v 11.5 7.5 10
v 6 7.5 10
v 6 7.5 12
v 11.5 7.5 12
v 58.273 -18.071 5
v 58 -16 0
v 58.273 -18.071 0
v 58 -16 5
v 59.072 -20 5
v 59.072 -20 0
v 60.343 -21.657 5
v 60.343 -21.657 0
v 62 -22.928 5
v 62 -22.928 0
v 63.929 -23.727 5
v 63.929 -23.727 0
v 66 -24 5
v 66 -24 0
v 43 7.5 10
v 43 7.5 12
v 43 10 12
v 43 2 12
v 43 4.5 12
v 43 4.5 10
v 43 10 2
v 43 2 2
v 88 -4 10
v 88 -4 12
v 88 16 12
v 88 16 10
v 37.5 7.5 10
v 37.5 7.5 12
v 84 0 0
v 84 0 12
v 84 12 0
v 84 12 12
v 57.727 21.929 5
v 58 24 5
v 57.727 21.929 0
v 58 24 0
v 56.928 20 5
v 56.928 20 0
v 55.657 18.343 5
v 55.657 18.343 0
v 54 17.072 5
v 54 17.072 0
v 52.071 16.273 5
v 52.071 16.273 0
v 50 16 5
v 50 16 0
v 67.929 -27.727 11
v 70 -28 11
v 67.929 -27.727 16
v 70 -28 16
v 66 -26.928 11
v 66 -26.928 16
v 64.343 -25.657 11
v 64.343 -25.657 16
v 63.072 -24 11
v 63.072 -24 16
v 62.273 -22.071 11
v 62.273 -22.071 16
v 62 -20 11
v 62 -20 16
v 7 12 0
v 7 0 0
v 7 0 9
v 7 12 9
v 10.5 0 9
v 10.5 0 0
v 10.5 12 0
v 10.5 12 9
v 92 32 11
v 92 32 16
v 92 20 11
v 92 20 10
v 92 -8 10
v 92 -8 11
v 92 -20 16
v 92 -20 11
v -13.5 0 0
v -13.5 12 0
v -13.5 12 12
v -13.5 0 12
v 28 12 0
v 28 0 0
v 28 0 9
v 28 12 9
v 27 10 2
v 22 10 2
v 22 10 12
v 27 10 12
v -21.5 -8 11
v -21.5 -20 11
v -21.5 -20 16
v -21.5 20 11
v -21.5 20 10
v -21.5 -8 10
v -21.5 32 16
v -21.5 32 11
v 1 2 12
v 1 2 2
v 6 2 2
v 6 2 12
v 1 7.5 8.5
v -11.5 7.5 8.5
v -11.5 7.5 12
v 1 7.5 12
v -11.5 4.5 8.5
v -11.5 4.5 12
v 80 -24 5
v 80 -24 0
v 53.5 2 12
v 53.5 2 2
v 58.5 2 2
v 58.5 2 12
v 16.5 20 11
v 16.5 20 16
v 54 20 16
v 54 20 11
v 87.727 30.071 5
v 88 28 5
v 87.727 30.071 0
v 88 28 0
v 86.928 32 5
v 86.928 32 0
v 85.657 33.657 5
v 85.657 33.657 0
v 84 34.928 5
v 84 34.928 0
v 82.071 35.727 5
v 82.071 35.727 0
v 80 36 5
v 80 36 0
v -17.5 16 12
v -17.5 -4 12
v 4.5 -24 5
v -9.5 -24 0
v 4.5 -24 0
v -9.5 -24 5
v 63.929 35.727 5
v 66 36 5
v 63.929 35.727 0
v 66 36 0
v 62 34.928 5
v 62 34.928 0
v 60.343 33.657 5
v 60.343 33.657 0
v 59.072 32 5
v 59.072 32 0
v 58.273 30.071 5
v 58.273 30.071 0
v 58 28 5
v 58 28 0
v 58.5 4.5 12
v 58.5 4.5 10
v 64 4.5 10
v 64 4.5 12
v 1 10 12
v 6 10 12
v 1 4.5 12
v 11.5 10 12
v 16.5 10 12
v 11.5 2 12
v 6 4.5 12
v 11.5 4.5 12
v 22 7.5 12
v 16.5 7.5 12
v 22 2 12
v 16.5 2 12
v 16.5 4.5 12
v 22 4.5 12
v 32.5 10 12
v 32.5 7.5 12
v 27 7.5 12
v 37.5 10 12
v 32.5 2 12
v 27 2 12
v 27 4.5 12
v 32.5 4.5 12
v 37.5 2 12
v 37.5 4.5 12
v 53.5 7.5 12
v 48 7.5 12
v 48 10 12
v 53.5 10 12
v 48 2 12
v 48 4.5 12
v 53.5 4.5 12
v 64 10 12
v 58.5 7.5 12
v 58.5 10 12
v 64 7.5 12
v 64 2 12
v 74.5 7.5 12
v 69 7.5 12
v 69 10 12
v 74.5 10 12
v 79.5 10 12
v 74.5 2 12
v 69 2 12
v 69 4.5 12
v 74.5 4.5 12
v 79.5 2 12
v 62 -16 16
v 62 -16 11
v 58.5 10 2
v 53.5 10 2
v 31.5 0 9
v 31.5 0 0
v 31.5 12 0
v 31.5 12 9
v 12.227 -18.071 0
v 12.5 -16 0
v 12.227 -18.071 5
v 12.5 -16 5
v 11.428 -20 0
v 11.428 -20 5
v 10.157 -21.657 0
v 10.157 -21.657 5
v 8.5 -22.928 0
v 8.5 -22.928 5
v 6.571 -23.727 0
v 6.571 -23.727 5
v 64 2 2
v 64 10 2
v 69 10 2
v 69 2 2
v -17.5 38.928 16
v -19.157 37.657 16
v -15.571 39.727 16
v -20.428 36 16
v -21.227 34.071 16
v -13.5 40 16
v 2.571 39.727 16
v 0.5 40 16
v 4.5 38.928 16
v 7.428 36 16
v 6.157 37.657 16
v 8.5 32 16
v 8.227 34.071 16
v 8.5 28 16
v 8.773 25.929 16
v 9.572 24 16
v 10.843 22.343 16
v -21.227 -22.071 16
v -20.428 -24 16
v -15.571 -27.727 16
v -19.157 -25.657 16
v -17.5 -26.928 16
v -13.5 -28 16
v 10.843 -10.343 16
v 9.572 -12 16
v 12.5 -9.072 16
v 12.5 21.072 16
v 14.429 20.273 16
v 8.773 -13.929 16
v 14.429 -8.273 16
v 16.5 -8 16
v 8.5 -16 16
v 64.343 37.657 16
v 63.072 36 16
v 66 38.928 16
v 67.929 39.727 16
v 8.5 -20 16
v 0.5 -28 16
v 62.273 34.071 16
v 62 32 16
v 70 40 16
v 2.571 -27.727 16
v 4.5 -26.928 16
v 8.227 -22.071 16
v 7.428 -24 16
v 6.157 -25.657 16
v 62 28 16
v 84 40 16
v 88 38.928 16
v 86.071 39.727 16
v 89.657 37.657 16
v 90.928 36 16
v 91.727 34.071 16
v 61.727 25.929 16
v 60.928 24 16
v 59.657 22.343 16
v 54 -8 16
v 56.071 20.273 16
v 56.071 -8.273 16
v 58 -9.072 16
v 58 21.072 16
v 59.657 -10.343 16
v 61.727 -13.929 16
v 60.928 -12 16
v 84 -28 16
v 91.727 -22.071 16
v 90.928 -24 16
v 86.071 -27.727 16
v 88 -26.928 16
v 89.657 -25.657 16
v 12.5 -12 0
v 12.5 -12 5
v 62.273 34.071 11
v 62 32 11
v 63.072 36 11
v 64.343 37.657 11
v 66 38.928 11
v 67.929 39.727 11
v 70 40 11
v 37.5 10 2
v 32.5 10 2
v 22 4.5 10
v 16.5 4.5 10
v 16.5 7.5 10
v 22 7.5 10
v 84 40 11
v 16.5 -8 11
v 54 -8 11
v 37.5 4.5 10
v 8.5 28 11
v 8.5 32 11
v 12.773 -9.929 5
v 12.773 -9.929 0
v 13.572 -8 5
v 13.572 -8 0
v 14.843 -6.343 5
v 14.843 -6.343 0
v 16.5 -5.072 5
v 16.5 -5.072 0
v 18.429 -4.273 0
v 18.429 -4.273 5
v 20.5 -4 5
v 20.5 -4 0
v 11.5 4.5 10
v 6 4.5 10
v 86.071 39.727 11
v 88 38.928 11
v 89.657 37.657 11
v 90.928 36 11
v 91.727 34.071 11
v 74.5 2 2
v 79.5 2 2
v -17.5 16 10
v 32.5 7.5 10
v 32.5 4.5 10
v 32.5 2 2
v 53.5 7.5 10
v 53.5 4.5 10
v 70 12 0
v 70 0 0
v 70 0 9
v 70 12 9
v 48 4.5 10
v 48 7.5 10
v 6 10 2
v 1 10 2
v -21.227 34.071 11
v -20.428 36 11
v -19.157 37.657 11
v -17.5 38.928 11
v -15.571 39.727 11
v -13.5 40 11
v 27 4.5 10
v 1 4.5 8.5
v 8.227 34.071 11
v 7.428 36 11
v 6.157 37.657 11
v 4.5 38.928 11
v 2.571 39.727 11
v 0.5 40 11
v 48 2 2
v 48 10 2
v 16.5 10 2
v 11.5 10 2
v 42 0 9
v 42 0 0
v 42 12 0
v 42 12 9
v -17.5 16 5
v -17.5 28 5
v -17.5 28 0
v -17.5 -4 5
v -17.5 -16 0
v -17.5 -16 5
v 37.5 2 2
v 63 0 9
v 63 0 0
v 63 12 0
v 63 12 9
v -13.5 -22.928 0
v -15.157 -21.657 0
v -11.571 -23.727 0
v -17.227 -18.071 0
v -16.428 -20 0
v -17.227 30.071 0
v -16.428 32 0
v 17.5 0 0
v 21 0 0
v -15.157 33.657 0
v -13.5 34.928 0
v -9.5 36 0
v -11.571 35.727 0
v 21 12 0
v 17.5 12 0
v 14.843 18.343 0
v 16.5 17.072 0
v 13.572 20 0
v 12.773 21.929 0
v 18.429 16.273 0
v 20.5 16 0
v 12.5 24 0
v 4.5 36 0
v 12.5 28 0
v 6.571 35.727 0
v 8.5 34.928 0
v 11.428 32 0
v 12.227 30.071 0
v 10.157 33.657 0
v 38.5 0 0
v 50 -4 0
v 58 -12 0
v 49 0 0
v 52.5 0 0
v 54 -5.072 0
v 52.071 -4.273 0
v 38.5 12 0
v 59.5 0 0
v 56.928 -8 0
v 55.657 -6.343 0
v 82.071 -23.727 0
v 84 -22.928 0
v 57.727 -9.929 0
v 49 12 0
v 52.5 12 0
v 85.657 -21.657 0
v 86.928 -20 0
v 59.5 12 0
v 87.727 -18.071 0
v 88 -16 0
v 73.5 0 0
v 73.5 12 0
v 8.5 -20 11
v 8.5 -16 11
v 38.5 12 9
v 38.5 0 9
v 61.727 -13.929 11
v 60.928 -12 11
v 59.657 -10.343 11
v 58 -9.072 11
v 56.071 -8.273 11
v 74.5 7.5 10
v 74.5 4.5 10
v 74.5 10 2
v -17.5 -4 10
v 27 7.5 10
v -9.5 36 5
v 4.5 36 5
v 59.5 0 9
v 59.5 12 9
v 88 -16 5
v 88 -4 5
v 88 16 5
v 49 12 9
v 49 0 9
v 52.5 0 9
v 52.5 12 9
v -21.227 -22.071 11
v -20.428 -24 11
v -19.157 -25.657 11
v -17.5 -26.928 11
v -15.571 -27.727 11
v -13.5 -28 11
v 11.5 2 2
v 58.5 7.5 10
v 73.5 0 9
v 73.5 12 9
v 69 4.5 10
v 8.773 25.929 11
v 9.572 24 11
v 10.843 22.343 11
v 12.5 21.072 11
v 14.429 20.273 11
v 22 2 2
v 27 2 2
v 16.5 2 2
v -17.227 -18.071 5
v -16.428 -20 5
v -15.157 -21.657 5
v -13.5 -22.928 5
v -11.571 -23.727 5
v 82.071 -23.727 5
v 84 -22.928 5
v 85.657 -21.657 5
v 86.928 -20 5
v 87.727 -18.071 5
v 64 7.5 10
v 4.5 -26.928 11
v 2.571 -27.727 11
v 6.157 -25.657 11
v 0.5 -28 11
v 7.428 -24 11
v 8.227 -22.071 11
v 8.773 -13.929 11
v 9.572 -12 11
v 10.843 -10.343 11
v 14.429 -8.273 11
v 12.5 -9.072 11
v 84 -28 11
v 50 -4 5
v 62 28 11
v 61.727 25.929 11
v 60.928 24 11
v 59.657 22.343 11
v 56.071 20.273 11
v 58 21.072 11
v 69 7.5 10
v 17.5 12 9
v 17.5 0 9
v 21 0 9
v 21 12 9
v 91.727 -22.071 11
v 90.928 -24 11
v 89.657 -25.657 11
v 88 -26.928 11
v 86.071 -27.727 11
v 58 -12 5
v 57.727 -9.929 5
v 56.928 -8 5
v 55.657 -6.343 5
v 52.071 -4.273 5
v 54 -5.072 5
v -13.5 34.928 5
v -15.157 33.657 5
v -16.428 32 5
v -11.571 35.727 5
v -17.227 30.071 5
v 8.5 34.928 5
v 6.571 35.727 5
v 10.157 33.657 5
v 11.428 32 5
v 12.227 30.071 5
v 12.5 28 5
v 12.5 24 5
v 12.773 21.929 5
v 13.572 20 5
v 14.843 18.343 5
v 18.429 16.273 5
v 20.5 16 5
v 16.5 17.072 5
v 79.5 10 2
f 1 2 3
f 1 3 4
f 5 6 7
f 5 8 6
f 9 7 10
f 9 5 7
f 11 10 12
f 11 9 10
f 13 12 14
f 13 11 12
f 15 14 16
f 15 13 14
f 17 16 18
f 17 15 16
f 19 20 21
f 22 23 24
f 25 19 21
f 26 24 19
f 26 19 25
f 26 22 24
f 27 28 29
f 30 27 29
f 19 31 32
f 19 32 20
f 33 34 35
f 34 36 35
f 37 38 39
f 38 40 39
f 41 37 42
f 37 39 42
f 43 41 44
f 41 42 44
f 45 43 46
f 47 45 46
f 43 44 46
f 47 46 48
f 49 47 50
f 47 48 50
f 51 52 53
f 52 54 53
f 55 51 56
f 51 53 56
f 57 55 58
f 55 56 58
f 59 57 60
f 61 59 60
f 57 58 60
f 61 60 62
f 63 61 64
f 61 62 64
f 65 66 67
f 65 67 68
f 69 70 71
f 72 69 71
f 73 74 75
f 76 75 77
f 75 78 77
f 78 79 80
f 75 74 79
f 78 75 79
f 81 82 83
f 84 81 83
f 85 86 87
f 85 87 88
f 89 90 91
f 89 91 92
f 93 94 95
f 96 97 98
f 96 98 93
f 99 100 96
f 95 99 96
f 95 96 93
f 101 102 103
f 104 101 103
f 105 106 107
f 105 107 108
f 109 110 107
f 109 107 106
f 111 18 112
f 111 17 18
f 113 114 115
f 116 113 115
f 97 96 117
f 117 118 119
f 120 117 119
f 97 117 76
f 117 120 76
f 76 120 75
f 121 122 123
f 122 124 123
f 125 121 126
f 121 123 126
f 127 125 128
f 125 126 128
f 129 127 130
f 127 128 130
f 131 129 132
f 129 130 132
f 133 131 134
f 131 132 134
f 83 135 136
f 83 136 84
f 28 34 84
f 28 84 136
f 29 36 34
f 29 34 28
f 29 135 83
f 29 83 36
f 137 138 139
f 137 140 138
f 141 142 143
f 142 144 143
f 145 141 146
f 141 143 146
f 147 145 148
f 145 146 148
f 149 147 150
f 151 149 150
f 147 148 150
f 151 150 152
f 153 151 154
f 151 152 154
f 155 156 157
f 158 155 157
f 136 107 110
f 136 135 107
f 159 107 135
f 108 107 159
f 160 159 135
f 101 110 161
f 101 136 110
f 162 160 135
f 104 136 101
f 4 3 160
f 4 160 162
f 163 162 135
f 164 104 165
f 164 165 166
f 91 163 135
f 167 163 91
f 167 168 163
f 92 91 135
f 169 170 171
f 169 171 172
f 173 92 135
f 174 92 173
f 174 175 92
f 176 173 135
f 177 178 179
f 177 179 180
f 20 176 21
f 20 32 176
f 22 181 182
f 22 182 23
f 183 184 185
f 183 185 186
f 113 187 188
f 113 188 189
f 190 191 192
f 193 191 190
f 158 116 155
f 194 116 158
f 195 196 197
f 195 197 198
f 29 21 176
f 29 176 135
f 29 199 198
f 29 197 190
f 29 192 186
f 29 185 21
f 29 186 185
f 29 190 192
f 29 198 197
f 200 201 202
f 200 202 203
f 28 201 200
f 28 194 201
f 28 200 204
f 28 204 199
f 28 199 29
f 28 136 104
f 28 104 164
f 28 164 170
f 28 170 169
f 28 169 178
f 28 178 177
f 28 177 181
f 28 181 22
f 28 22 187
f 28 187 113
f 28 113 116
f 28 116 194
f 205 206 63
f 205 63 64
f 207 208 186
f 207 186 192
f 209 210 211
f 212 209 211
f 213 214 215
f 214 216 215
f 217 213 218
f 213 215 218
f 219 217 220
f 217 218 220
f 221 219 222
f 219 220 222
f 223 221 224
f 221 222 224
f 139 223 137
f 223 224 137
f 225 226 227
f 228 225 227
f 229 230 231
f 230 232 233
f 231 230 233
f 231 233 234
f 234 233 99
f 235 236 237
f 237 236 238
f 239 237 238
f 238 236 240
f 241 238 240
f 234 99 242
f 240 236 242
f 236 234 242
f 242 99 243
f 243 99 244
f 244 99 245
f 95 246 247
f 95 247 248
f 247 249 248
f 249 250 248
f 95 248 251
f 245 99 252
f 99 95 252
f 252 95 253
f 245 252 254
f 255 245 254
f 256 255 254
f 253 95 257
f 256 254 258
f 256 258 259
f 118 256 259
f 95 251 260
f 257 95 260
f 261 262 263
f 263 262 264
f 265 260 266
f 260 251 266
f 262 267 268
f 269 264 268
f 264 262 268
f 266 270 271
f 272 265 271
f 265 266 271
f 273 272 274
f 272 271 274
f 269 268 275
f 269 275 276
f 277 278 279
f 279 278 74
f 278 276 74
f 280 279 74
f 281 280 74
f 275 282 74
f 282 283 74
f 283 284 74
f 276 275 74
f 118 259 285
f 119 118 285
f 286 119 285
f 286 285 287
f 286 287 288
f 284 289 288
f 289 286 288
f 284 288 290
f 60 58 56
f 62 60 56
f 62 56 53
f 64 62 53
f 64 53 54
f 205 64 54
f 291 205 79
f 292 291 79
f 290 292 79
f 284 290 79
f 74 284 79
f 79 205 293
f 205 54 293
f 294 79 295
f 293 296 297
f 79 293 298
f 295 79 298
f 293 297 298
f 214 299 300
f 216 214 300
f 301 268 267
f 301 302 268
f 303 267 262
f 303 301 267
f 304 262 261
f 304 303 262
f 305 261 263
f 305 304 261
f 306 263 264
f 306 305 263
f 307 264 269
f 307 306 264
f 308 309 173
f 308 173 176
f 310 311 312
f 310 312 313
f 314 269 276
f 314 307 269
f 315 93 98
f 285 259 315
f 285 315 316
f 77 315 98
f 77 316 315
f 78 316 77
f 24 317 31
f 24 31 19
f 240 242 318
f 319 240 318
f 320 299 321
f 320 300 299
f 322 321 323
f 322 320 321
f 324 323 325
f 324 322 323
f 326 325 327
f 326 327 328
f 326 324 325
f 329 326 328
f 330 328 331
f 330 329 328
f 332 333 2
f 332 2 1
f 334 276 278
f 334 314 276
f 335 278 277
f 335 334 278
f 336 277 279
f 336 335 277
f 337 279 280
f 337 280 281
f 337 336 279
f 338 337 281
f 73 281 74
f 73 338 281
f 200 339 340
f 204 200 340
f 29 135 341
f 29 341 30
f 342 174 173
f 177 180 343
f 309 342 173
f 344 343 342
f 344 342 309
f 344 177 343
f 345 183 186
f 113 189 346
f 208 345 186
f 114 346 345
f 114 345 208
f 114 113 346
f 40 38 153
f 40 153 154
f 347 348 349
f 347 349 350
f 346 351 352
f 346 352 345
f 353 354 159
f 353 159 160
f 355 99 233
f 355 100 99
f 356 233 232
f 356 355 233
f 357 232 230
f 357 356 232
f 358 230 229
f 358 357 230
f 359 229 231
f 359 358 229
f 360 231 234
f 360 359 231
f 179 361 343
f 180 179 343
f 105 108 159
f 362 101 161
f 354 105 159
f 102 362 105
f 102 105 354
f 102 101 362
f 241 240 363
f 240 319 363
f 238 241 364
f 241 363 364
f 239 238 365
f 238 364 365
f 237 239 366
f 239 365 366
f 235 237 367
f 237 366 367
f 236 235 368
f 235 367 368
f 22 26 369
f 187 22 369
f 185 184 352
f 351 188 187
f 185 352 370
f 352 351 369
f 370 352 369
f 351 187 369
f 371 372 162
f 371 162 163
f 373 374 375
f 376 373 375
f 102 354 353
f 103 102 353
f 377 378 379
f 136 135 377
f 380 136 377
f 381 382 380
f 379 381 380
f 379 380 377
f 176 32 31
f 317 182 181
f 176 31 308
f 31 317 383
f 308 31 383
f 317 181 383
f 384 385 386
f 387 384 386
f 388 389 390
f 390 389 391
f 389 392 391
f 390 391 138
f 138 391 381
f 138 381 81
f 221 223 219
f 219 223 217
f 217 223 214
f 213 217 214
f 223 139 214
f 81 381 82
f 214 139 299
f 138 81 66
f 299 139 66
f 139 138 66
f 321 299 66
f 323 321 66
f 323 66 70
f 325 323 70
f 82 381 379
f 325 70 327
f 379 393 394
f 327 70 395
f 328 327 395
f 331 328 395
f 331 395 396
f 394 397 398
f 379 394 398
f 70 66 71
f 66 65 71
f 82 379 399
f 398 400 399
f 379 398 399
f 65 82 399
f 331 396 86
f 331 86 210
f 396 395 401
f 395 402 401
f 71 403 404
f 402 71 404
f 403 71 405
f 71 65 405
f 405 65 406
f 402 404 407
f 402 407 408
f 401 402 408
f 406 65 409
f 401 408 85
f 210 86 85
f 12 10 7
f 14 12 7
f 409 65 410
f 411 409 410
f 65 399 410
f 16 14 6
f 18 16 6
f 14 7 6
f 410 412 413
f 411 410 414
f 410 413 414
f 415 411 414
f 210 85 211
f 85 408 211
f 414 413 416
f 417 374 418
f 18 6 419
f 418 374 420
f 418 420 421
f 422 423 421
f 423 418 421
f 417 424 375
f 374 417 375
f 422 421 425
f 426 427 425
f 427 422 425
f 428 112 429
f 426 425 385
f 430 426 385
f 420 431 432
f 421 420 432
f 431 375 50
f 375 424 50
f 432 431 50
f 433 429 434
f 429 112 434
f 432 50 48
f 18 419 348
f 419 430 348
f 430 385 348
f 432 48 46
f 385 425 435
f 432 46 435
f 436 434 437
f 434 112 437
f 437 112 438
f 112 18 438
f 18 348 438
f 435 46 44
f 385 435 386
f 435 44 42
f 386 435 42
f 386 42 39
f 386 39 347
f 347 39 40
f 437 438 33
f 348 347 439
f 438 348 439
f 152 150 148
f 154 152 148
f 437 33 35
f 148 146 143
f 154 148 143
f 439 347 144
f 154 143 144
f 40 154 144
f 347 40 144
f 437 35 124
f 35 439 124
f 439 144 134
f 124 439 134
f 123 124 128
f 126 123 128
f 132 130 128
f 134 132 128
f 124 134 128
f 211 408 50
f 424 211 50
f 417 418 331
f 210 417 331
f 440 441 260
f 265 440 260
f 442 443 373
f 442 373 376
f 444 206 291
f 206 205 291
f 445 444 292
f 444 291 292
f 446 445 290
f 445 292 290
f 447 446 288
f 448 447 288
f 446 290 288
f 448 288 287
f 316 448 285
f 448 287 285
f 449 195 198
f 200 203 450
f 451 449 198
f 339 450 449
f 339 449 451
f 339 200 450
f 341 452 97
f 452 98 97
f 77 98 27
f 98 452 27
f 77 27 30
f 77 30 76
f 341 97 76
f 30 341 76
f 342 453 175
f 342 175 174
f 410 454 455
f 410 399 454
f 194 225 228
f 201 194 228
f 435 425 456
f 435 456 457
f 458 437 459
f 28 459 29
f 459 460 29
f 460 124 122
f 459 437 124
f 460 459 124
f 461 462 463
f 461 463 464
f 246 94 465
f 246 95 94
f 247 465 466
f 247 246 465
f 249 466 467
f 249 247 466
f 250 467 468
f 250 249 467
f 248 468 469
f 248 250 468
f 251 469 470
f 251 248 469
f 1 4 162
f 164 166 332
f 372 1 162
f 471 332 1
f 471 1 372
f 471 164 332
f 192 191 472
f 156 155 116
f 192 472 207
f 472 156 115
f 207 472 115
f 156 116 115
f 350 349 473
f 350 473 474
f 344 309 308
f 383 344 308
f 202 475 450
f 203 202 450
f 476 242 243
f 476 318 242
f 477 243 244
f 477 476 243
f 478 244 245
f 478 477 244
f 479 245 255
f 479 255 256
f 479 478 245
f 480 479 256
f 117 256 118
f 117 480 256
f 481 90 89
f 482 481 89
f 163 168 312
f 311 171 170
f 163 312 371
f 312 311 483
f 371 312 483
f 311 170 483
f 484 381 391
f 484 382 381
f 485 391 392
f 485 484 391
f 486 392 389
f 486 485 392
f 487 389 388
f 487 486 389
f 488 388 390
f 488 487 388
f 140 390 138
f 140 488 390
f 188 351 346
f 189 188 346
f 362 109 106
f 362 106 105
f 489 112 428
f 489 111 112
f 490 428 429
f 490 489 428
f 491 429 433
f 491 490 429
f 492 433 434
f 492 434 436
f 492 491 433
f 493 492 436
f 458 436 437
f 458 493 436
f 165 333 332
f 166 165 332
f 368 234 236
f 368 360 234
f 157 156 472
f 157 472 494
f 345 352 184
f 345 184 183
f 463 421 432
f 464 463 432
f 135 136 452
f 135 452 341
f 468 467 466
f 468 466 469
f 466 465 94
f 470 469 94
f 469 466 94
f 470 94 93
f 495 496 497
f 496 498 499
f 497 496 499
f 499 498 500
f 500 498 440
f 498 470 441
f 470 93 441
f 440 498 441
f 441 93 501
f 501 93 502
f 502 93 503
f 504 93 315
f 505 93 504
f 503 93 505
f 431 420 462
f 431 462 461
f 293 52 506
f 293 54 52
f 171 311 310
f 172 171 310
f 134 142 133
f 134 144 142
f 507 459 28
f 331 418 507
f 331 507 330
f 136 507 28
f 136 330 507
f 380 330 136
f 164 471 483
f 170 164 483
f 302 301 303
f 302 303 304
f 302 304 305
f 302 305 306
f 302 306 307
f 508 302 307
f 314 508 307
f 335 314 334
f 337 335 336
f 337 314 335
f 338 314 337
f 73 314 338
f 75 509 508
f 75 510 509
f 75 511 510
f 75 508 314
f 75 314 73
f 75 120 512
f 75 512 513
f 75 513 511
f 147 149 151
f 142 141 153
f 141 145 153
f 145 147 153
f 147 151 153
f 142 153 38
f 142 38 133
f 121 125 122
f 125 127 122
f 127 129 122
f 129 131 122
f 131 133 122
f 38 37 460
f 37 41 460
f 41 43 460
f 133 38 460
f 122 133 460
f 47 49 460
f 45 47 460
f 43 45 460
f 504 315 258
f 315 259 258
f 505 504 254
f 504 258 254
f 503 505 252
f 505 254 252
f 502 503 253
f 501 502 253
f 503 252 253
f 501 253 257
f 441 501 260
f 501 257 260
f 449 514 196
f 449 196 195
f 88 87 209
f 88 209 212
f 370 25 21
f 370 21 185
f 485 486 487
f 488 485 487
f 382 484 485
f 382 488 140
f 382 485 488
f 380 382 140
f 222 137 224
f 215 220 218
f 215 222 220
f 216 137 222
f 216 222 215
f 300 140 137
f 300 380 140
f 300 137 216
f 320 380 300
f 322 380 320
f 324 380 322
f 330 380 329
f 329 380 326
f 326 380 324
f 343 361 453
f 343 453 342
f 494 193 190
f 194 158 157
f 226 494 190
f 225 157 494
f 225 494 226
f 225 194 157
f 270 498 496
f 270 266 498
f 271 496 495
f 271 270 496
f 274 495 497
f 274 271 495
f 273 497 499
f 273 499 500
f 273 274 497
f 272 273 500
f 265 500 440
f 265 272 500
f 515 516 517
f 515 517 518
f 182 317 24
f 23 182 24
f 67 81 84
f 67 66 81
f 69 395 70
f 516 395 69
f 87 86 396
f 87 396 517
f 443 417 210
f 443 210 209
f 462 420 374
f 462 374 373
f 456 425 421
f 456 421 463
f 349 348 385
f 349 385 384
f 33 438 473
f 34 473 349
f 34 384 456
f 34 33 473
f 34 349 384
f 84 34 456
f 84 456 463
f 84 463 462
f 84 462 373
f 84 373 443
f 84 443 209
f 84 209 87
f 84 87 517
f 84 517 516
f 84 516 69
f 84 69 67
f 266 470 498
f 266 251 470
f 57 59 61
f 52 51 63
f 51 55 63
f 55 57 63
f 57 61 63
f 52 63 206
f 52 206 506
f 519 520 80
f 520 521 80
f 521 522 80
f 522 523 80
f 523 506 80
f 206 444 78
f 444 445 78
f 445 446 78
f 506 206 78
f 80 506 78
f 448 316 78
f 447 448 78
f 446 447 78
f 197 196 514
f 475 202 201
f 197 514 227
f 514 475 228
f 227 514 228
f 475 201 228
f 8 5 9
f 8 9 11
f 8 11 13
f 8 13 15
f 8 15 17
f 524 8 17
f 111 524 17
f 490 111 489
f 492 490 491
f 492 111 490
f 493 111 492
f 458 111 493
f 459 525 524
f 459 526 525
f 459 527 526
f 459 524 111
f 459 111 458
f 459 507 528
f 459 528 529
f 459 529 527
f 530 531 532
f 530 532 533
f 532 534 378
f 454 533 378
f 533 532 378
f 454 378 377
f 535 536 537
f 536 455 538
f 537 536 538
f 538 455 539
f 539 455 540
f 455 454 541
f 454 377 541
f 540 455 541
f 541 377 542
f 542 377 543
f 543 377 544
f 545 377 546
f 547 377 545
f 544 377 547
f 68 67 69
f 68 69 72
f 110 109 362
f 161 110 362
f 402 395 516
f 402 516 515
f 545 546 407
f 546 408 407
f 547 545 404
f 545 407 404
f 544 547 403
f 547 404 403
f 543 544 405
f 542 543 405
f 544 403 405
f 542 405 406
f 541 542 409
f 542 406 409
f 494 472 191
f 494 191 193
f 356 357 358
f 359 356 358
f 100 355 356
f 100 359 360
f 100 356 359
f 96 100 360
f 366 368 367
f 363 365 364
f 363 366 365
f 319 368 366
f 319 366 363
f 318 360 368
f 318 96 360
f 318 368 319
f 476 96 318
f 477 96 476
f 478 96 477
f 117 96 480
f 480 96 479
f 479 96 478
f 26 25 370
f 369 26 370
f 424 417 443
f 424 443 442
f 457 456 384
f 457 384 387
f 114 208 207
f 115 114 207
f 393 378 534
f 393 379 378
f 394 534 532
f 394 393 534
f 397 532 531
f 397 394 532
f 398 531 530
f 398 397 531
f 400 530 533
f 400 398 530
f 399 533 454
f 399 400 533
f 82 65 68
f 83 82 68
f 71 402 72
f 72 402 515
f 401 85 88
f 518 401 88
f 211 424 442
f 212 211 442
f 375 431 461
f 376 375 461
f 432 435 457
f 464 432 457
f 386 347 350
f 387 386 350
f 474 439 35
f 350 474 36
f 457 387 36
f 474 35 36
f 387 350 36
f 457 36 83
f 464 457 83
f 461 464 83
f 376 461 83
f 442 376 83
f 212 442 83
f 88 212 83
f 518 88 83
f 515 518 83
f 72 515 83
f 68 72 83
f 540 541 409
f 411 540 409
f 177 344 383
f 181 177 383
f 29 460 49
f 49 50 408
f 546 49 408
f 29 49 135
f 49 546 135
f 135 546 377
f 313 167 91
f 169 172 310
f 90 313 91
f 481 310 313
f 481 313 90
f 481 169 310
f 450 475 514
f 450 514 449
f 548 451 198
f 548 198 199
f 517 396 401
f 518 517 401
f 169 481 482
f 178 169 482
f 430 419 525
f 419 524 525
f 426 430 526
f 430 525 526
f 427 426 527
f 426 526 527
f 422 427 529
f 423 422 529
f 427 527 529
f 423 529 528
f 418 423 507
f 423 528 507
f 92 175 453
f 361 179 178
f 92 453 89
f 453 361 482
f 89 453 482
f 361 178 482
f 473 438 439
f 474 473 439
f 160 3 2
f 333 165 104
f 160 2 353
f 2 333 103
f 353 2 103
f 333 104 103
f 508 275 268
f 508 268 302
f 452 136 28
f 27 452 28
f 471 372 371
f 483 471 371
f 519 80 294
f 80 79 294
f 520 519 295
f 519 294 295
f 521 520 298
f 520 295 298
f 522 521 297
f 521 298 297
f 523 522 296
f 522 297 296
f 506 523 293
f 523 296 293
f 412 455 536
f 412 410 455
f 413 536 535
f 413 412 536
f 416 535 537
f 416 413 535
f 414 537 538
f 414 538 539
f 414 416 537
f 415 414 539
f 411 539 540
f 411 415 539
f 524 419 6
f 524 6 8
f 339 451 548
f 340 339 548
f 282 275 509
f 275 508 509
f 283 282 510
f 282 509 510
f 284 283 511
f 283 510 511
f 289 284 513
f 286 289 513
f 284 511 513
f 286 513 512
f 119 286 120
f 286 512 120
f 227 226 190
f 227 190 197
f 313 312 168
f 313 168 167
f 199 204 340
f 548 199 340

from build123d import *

# Parameters (mm, degrees)
SKETCH2_W            = 7
SKETCH2_H            = 12
BOSS_EXTRUDE1_DEPTH  = 12
SKETCH3_W            = 5
SKETCH3_H            = 8
CUT_EXTRUDE1_DEPTH   = 10
SKETCH4_W            = 3
SKETCH4_H            = 12
BOSS_EXTRUDE2_DEPTH  = 3.5
LPATTERN1_COUNT      = 8
LPATTERN1_PITCH      = 10.5
SKETCH5_W            = 9
SKETCH5_H            = 12
BOSS_EXTRUDE3_DEPTH  = 3.5
SKETCH6_W            = 12
SKETCH6_H            = 12
BOSS_EXTRUDE4_DEPTH  = 13.5
SKETCH7_W            = 12.5
SKETCH7_H            = 3
CUT_EXTRUDE2_DEPTH   = 3.5
SKETCH8_W            = 68.5
SKETCH8_H            = 3
CUT_EXTRUDE3_DEPTH   = 2
SKETCH11_W           = 105.5
SKETCH11_H           = 20
BOSS_EXTRUDE6_DEPTH  = 16
SPLIT1_START         = -4
SPLIT1_OUTLINE_W     = 105.5
SPLIT1_OUTLINE_H     = 4
SPLIT1_DEPTH         = 20
SPLIT1_START_2       = 2
SPLIT1_2_OUTLINE_W   = 5
SPLIT1_2_OUTLINE_H   = 10
SPLIT1_2_DEPTH       = 8
SPLIT1_START_3       = 4.5
SPLIT1_3_OUTLINE_W   = 5.5
SPLIT1_3_OUTLINE_H   = 2
SPLIT1_3_OUTLINE_W_2 = 12.5
SPLIT1_3_OUTLINE_H_2 = 3.5
SPLIT1_3_DEPTH       = 3
SPLIT1_START_4       = 12
SPLIT1_4_OUTLINE_W   = 105.5
SPLIT1_4_OUTLINE_H   = 20
SPLIT1_4_DEPTH       = 4
SPLIT1_5_OUTLINE_W   = 5
SPLIT1_5_OUTLINE_H   = 8
SPLIT1_5_DEPTH       = 10
SPLIT1_START_5       = 10
SPLIT1_6_OUTLINE_W   = 5.5
SPLIT1_6_OUTLINE_H   = 3
SPLIT1_6_DEPTH       = 2
SKETCH12_W           = 30
SKETCH12_H           = 5
BOSS_EXTRUDE7_DEPTH  = 20
SKETCH13_W           = 30
SKETCH13_H           = 5
BOSS_EXTRUDE8_DEPTH  = 20
FILLET1_R            = 8
SKETCH14_W           = 113.5
SKETCH14_H           = 28
SKETCH14_W_2         = 105.5
SKETCH14_H_2         = 20
BOSS_EXTRUDE9_DEPTH  = 6
SKETCH16_W           = 30
SKETCH16_H           = 5
BOSS_EXTRUDE10_DEPTH = 20
SKETCH17_W           = 30
SKETCH17_H           = 5
BOSS_EXTRUDE11_DEPTH = 20
FILLET2_R            = 8


# Read off the part's stored shape, not the designer's step: Split1
with BuildPart() as part:
    # Sketch2 → Boss-Extrude1 (new body)
    with BuildSketch(Plane.XY):
        with Locations((3.5, 6)):
            Rectangle(SKETCH2_W, SKETCH2_H)
    extrude(amount=BOSS_EXTRUDE1_DEPTH)

    # Sketch3 → Cut-Extrude1 (cut)
    with BuildSketch(Plane.XY.offset(12)):
        with Locations((3.5, 6)):
            Rectangle(SKETCH3_W, SKETCH3_H)
    extrude(amount=-CUT_EXTRUDE1_DEPTH, mode=Mode.SUBTRACT)

    # Sketch4 → Boss-Extrude2 (add)
    with BuildSketch(Plane(origin=(7, 0, 0), x_dir=(0, 0, -1), z_dir=(1, 0, 0))):
        with Locations((-10.5, 6)):
            Rectangle(SKETCH4_W, SKETCH4_H)
    extrude(amount=BOSS_EXTRUDE2_DEPTH)


with BuildPart() as lpattern1_1:
    # LPattern1: pattern copy
    add(part.part.moved(Location(Vector(1, 0, 0) * (1 * LPATTERN1_PITCH))))


with BuildPart() as lpattern1_2:
    # LPattern1: pattern copy
    add(part.part.moved(Location(Vector(1, 0, 0) * (2 * LPATTERN1_PITCH))))


with BuildPart() as lpattern1_3:
    # LPattern1: pattern copy
    add(part.part.moved(Location(Vector(1, 0, 0) * (3 * LPATTERN1_PITCH))))


with BuildPart() as lpattern1_4:
    # LPattern1: pattern copy
    add(part.part.moved(Location(Vector(1, 0, 0) * (4 * LPATTERN1_PITCH))))


with BuildPart() as lpattern1_5:
    # LPattern1: pattern copy
    add(part.part.moved(Location(Vector(1, 0, 0) * (5 * LPATTERN1_PITCH))))


with BuildPart() as lpattern1_6:
    # LPattern1: pattern copy
    add(part.part.moved(Location(Vector(1, 0, 0) * (6 * LPATTERN1_PITCH))))


with BuildPart() as lpattern1_7:
    # LPattern1: pattern copy
    add(part.part.moved(Location(Vector(1, 0, 0) * (7 * LPATTERN1_PITCH))))

    # Combine2: union LPattern1_4, LPattern1_1, part, LPattern1_6, LPattern1_3, LPattern1_5, LPattern1_2
    add(lpattern1_4.part)
    add(lpattern1_1.part)
    add(part.part)
    add(lpattern1_6.part)
    add(lpattern1_3.part)
    add(lpattern1_5.part)
    add(lpattern1_2.part)

    # Sketch5 → Boss-Extrude3 (add)
    with BuildSketch(Plane(origin=(80.5, 0, 0), x_dir=(0, 0, -1), z_dir=(1, 0, 0))):
        with Locations((-4.5, 6)):
            Rectangle(SKETCH5_W, SKETCH5_H)
    extrude(amount=BOSS_EXTRUDE3_DEPTH)

    # Sketch6 → Boss-Extrude4 (add)
    with BuildSketch(Plane.ZY):
        with Locations((6, 6)):
            Rectangle(SKETCH6_W, SKETCH6_H)
    extrude(amount=BOSS_EXTRUDE4_DEPTH)

    # Sketch7 → Cut-Extrude2 (cut)
    with BuildSketch(Plane.XY.offset(12)):
        with Locations((-5.25, 6)):
            Rectangle(SKETCH7_W, SKETCH7_H)
    extrude(amount=-CUT_EXTRUDE2_DEPTH, mode=Mode.SUBTRACT)

    # Sketch8 → Cut-Extrude3 (cut)
    with BuildSketch(Plane.XY.offset(12)):
        with Locations((40.25, 6)):
            Rectangle(SKETCH8_W, SKETCH8_H)
    extrude(amount=-CUT_EXTRUDE3_DEPTH, mode=Mode.SUBTRACT)


with BuildPart() as body_2:
    # Sketch11 → Boss-Extrude6 (new body)
    with BuildSketch(Plane(origin=(0, 0, 0), x_dir=(-1, 0, 0), z_dir=(0, 0, -1))):
        with Locations((-35.25, 6)):
            Rectangle(SKETCH11_W, SKETCH11_H)
    extrude(amount=-BOSS_EXTRUDE6_DEPTH)

    # Combine3: cut LPattern1_7
    add(lpattern1_7.part, mode=Mode.SUBTRACT)

    # Split1 4 outline → Split1 4 (cut)
    with BuildSketch(Plane.XY.offset(SPLIT1_START_4)):
        with Locations((35.25, 6)):
            Rectangle(SPLIT1_4_OUTLINE_W, SPLIT1_4_OUTLINE_H)
    extrude(amount=SPLIT1_4_DEPTH, mode=Mode.SUBTRACT)

    # Split1 5 outline → Split1 5 (cut)
    with BuildSketch(Plane.XY.offset(SPLIT1_START_2)):
        with Locations((77, 6)):
            Rectangle(SPLIT1_5_OUTLINE_W, SPLIT1_5_OUTLINE_H)
        with Locations((66.5, 6)):
            Rectangle(SPLIT1_5_OUTLINE_W, SPLIT1_5_OUTLINE_H)
        with Locations((56, 6)):
            Rectangle(SPLIT1_5_OUTLINE_W, SPLIT1_5_OUTLINE_H)
        with Locations((45.5, 6)):
            Rectangle(SPLIT1_5_OUTLINE_W, SPLIT1_5_OUTLINE_H)
        with Locations((35, 6)):
            Rectangle(SPLIT1_5_OUTLINE_W, SPLIT1_5_OUTLINE_H)
        with Locations((24.5, 6)):
            Rectangle(SPLIT1_5_OUTLINE_W, SPLIT1_5_OUTLINE_H)
        with Locations((14, 6)):
            Rectangle(SPLIT1_5_OUTLINE_W, SPLIT1_5_OUTLINE_H)
        Polygon((6, 10), (1, 10), (1, 7.5), (-11.5, 7.5), (-11.5, 4.5), (1, 4.5), (1, 2), (6, 2), align=None)
    extrude(amount=SPLIT1_5_DEPTH, mode=Mode.SUBTRACT)

    # Split1 6 outline → Split1 6 (cut)
    with BuildSketch(Plane.XY.offset(SPLIT1_START_5)):
        with Locations((71.75, 6)):
            Rectangle(SPLIT1_6_OUTLINE_W, SPLIT1_6_OUTLINE_H)
        with Locations((61.25, 6)):
            Rectangle(SPLIT1_6_OUTLINE_W, SPLIT1_6_OUTLINE_H)
        with Locations((50.75, 6)):
            Rectangle(SPLIT1_6_OUTLINE_W, SPLIT1_6_OUTLINE_H)
        with Locations((40.25, 6)):
            Rectangle(SPLIT1_6_OUTLINE_W, SPLIT1_6_OUTLINE_H)
        with Locations((29.75, 6)):
            Rectangle(SPLIT1_6_OUTLINE_W, SPLIT1_6_OUTLINE_H)
        with Locations((19.25, 6)):
            Rectangle(SPLIT1_6_OUTLINE_W, SPLIT1_6_OUTLINE_H)
        with Locations((8.75, 6)):
            Rectangle(SPLIT1_6_OUTLINE_W, SPLIT1_6_OUTLINE_H)
    extrude(amount=SPLIT1_6_DEPTH, mode=Mode.SUBTRACT)

    # Sketch12 → Boss-Extrude7 (add)
    with BuildSketch(Plane(origin=(0, 16, 0), x_dir=(1, 0, 0), z_dir=(0, 1, 0))):
        with Locations((-2.5, -2.5)):
            Rectangle(SKETCH12_W, SKETCH12_H)
        with Locations((73, -2.5)):
            Rectangle(SKETCH12_W, SKETCH12_H)
    extrude(amount=BOSS_EXTRUDE7_DEPTH)

    # Sketch13 → Boss-Extrude8 (add)
    with BuildSketch(Plane.XZ.offset(4)):
        with Locations((73, 2.5)):
            Rectangle(SKETCH13_W, SKETCH13_H)
        with Locations((-2.5, 2.5)):
            Rectangle(SKETCH13_W, SKETCH13_H)
    extrude(amount=BOSS_EXTRUDE8_DEPTH)

    # Fillet1
    fillet1_edges = [body_2.edges().sort_by_distance(p)[0] for p in [
        (58, 16, 2.5),
        (58, 36, 2.5),
        (88, 36, 2.5),
        (58, -4, 2.5),
        (88, -24, 2.5),
        (58, -24, 2.5),
        (12.5, -4, 2.5),
        (12.5, -24, 2.5),
        (-17.5, -24, 2.5),
        (12.5, 16, 2.5),
        (-17.5, 36, 2.5),
        (12.5, 36, 2.5),
    ]]
    fillet(fillet1_edges, radius=FILLET1_R)


with BuildPart() as body_2_2:
    # Split1 outline → Split1 (new body)
    with BuildSketch(Plane(origin=(0, 0, 0), x_dir=(1, 0, 0), z_dir=(0, 1, 0)).offset(SPLIT1_START)):
        with Locations((35.25, -14)):
            Rectangle(SPLIT1_OUTLINE_W, SPLIT1_OUTLINE_H)
    extrude(amount=SPLIT1_DEPTH)

    # Split1 2 outline → Split1 2 (add)
    with BuildSketch(Plane(origin=(0, 0, 0), x_dir=(1, 0, 0), z_dir=(0, 1, 0)).offset(SPLIT1_START_2)):
        with Locations((77, -7)):
            Rectangle(SPLIT1_2_OUTLINE_W, SPLIT1_2_OUTLINE_H)
        with Locations((66.5, -7)):
            Rectangle(SPLIT1_2_OUTLINE_W, SPLIT1_2_OUTLINE_H)
        with Locations((56, -7)):
            Rectangle(SPLIT1_2_OUTLINE_W, SPLIT1_2_OUTLINE_H)
        with Locations((3.5, -7)):
            Rectangle(SPLIT1_2_OUTLINE_W, SPLIT1_2_OUTLINE_H)
        with Locations((45.5, -7)):
            Rectangle(SPLIT1_2_OUTLINE_W, SPLIT1_2_OUTLINE_H)
        with Locations((14, -7)):
            Rectangle(SPLIT1_2_OUTLINE_W, SPLIT1_2_OUTLINE_H)
        with Locations((35, -7)):
            Rectangle(SPLIT1_2_OUTLINE_W, SPLIT1_2_OUTLINE_H)
        with Locations((24.5, -7)):
            Rectangle(SPLIT1_2_OUTLINE_W, SPLIT1_2_OUTLINE_H)
    extrude(amount=SPLIT1_2_DEPTH)

    # Split1 3 outline → Split1 3 (add)
    with BuildSketch(Plane(origin=(0, 0, 0), x_dir=(1, 0, 0), z_dir=(0, 1, 0)).offset(SPLIT1_START_3)):
        with Locations((71.75, -11)):
            Rectangle(SPLIT1_3_OUTLINE_W, SPLIT1_3_OUTLINE_H)
        with Locations((61.25, -11)):
            Rectangle(SPLIT1_3_OUTLINE_W, SPLIT1_3_OUTLINE_H)
        with Locations((-5.25, -10.25)):
            Rectangle(SPLIT1_3_OUTLINE_W_2, SPLIT1_3_OUTLINE_H_2)
        with Locations((50.75, -11)):
            Rectangle(SPLIT1_3_OUTLINE_W, SPLIT1_3_OUTLINE_H)
        with Locations((8.75, -11)):
            Rectangle(SPLIT1_3_OUTLINE_W, SPLIT1_3_OUTLINE_H)
        with Locations((40.25, -11)):
            Rectangle(SPLIT1_3_OUTLINE_W, SPLIT1_3_OUTLINE_H)
        with Locations((19.25, -11)):
            Rectangle(SPLIT1_3_OUTLINE_W, SPLIT1_3_OUTLINE_H)
        with Locations((29.75, -11)):
            Rectangle(SPLIT1_3_OUTLINE_W, SPLIT1_3_OUTLINE_H)
    extrude(amount=SPLIT1_3_DEPTH)

    # Sketch14 → Boss-Extrude9 (add)
    with BuildSketch(Plane.XY.offset(16)):
        with Locations((35.25, 6)):
            Rectangle(SKETCH14_W, SKETCH14_H)
        with Locations((35.25, 6)):
            Rectangle(SKETCH14_W_2, SKETCH14_H_2, mode=Mode.SUBTRACT)
    extrude(amount=-BOSS_EXTRUDE9_DEPTH)

    # Sketch16 → Boss-Extrude10 (add)
    with BuildSketch(Plane.XZ.offset(8)):
        with Locations((-6.5, 13.5)):
            Rectangle(SKETCH16_W, SKETCH16_H)
        with Locations((77, 13.5)):
            Rectangle(SKETCH16_W, SKETCH16_H)
    extrude(amount=BOSS_EXTRUDE10_DEPTH)

    # Sketch17 → Boss-Extrude11 (add)
    with BuildSketch(Plane(origin=(0, 20, 0), x_dir=(1, 0, 0), z_dir=(0, 1, 0))):
        with Locations((77, -13.5)):
            Rectangle(SKETCH17_W, SKETCH17_H)
        with Locations((-6.5, -13.5)):
            Rectangle(SKETCH17_W, SKETCH17_H)
    extrude(amount=BOSS_EXTRUDE11_DEPTH)

    # Fillet2
    fillet2_edges = [body_2_2.edges().sort_by_distance(p)[0] for p in [
        (62, -8, 13.5),
        (92, -28, 13.5),
        (62, -28, 13.5),
        (8.5, -8, 13.5),
        (-21.5, -28, 13.5),
        (8.5, -28, 13.5),
        (8.5, 20, 13.5),
        (-21.5, 40, 13.5),
        (8.5, 40, 13.5),
        (62, 20, 13.5),
        (92, 40, 13.5),
        (62, 40, 13.5),
    ]]
    fillet(fillet2_edges, radius=FILLET2_R)


solid = Compound([body_2.part, body_2_2.part])
